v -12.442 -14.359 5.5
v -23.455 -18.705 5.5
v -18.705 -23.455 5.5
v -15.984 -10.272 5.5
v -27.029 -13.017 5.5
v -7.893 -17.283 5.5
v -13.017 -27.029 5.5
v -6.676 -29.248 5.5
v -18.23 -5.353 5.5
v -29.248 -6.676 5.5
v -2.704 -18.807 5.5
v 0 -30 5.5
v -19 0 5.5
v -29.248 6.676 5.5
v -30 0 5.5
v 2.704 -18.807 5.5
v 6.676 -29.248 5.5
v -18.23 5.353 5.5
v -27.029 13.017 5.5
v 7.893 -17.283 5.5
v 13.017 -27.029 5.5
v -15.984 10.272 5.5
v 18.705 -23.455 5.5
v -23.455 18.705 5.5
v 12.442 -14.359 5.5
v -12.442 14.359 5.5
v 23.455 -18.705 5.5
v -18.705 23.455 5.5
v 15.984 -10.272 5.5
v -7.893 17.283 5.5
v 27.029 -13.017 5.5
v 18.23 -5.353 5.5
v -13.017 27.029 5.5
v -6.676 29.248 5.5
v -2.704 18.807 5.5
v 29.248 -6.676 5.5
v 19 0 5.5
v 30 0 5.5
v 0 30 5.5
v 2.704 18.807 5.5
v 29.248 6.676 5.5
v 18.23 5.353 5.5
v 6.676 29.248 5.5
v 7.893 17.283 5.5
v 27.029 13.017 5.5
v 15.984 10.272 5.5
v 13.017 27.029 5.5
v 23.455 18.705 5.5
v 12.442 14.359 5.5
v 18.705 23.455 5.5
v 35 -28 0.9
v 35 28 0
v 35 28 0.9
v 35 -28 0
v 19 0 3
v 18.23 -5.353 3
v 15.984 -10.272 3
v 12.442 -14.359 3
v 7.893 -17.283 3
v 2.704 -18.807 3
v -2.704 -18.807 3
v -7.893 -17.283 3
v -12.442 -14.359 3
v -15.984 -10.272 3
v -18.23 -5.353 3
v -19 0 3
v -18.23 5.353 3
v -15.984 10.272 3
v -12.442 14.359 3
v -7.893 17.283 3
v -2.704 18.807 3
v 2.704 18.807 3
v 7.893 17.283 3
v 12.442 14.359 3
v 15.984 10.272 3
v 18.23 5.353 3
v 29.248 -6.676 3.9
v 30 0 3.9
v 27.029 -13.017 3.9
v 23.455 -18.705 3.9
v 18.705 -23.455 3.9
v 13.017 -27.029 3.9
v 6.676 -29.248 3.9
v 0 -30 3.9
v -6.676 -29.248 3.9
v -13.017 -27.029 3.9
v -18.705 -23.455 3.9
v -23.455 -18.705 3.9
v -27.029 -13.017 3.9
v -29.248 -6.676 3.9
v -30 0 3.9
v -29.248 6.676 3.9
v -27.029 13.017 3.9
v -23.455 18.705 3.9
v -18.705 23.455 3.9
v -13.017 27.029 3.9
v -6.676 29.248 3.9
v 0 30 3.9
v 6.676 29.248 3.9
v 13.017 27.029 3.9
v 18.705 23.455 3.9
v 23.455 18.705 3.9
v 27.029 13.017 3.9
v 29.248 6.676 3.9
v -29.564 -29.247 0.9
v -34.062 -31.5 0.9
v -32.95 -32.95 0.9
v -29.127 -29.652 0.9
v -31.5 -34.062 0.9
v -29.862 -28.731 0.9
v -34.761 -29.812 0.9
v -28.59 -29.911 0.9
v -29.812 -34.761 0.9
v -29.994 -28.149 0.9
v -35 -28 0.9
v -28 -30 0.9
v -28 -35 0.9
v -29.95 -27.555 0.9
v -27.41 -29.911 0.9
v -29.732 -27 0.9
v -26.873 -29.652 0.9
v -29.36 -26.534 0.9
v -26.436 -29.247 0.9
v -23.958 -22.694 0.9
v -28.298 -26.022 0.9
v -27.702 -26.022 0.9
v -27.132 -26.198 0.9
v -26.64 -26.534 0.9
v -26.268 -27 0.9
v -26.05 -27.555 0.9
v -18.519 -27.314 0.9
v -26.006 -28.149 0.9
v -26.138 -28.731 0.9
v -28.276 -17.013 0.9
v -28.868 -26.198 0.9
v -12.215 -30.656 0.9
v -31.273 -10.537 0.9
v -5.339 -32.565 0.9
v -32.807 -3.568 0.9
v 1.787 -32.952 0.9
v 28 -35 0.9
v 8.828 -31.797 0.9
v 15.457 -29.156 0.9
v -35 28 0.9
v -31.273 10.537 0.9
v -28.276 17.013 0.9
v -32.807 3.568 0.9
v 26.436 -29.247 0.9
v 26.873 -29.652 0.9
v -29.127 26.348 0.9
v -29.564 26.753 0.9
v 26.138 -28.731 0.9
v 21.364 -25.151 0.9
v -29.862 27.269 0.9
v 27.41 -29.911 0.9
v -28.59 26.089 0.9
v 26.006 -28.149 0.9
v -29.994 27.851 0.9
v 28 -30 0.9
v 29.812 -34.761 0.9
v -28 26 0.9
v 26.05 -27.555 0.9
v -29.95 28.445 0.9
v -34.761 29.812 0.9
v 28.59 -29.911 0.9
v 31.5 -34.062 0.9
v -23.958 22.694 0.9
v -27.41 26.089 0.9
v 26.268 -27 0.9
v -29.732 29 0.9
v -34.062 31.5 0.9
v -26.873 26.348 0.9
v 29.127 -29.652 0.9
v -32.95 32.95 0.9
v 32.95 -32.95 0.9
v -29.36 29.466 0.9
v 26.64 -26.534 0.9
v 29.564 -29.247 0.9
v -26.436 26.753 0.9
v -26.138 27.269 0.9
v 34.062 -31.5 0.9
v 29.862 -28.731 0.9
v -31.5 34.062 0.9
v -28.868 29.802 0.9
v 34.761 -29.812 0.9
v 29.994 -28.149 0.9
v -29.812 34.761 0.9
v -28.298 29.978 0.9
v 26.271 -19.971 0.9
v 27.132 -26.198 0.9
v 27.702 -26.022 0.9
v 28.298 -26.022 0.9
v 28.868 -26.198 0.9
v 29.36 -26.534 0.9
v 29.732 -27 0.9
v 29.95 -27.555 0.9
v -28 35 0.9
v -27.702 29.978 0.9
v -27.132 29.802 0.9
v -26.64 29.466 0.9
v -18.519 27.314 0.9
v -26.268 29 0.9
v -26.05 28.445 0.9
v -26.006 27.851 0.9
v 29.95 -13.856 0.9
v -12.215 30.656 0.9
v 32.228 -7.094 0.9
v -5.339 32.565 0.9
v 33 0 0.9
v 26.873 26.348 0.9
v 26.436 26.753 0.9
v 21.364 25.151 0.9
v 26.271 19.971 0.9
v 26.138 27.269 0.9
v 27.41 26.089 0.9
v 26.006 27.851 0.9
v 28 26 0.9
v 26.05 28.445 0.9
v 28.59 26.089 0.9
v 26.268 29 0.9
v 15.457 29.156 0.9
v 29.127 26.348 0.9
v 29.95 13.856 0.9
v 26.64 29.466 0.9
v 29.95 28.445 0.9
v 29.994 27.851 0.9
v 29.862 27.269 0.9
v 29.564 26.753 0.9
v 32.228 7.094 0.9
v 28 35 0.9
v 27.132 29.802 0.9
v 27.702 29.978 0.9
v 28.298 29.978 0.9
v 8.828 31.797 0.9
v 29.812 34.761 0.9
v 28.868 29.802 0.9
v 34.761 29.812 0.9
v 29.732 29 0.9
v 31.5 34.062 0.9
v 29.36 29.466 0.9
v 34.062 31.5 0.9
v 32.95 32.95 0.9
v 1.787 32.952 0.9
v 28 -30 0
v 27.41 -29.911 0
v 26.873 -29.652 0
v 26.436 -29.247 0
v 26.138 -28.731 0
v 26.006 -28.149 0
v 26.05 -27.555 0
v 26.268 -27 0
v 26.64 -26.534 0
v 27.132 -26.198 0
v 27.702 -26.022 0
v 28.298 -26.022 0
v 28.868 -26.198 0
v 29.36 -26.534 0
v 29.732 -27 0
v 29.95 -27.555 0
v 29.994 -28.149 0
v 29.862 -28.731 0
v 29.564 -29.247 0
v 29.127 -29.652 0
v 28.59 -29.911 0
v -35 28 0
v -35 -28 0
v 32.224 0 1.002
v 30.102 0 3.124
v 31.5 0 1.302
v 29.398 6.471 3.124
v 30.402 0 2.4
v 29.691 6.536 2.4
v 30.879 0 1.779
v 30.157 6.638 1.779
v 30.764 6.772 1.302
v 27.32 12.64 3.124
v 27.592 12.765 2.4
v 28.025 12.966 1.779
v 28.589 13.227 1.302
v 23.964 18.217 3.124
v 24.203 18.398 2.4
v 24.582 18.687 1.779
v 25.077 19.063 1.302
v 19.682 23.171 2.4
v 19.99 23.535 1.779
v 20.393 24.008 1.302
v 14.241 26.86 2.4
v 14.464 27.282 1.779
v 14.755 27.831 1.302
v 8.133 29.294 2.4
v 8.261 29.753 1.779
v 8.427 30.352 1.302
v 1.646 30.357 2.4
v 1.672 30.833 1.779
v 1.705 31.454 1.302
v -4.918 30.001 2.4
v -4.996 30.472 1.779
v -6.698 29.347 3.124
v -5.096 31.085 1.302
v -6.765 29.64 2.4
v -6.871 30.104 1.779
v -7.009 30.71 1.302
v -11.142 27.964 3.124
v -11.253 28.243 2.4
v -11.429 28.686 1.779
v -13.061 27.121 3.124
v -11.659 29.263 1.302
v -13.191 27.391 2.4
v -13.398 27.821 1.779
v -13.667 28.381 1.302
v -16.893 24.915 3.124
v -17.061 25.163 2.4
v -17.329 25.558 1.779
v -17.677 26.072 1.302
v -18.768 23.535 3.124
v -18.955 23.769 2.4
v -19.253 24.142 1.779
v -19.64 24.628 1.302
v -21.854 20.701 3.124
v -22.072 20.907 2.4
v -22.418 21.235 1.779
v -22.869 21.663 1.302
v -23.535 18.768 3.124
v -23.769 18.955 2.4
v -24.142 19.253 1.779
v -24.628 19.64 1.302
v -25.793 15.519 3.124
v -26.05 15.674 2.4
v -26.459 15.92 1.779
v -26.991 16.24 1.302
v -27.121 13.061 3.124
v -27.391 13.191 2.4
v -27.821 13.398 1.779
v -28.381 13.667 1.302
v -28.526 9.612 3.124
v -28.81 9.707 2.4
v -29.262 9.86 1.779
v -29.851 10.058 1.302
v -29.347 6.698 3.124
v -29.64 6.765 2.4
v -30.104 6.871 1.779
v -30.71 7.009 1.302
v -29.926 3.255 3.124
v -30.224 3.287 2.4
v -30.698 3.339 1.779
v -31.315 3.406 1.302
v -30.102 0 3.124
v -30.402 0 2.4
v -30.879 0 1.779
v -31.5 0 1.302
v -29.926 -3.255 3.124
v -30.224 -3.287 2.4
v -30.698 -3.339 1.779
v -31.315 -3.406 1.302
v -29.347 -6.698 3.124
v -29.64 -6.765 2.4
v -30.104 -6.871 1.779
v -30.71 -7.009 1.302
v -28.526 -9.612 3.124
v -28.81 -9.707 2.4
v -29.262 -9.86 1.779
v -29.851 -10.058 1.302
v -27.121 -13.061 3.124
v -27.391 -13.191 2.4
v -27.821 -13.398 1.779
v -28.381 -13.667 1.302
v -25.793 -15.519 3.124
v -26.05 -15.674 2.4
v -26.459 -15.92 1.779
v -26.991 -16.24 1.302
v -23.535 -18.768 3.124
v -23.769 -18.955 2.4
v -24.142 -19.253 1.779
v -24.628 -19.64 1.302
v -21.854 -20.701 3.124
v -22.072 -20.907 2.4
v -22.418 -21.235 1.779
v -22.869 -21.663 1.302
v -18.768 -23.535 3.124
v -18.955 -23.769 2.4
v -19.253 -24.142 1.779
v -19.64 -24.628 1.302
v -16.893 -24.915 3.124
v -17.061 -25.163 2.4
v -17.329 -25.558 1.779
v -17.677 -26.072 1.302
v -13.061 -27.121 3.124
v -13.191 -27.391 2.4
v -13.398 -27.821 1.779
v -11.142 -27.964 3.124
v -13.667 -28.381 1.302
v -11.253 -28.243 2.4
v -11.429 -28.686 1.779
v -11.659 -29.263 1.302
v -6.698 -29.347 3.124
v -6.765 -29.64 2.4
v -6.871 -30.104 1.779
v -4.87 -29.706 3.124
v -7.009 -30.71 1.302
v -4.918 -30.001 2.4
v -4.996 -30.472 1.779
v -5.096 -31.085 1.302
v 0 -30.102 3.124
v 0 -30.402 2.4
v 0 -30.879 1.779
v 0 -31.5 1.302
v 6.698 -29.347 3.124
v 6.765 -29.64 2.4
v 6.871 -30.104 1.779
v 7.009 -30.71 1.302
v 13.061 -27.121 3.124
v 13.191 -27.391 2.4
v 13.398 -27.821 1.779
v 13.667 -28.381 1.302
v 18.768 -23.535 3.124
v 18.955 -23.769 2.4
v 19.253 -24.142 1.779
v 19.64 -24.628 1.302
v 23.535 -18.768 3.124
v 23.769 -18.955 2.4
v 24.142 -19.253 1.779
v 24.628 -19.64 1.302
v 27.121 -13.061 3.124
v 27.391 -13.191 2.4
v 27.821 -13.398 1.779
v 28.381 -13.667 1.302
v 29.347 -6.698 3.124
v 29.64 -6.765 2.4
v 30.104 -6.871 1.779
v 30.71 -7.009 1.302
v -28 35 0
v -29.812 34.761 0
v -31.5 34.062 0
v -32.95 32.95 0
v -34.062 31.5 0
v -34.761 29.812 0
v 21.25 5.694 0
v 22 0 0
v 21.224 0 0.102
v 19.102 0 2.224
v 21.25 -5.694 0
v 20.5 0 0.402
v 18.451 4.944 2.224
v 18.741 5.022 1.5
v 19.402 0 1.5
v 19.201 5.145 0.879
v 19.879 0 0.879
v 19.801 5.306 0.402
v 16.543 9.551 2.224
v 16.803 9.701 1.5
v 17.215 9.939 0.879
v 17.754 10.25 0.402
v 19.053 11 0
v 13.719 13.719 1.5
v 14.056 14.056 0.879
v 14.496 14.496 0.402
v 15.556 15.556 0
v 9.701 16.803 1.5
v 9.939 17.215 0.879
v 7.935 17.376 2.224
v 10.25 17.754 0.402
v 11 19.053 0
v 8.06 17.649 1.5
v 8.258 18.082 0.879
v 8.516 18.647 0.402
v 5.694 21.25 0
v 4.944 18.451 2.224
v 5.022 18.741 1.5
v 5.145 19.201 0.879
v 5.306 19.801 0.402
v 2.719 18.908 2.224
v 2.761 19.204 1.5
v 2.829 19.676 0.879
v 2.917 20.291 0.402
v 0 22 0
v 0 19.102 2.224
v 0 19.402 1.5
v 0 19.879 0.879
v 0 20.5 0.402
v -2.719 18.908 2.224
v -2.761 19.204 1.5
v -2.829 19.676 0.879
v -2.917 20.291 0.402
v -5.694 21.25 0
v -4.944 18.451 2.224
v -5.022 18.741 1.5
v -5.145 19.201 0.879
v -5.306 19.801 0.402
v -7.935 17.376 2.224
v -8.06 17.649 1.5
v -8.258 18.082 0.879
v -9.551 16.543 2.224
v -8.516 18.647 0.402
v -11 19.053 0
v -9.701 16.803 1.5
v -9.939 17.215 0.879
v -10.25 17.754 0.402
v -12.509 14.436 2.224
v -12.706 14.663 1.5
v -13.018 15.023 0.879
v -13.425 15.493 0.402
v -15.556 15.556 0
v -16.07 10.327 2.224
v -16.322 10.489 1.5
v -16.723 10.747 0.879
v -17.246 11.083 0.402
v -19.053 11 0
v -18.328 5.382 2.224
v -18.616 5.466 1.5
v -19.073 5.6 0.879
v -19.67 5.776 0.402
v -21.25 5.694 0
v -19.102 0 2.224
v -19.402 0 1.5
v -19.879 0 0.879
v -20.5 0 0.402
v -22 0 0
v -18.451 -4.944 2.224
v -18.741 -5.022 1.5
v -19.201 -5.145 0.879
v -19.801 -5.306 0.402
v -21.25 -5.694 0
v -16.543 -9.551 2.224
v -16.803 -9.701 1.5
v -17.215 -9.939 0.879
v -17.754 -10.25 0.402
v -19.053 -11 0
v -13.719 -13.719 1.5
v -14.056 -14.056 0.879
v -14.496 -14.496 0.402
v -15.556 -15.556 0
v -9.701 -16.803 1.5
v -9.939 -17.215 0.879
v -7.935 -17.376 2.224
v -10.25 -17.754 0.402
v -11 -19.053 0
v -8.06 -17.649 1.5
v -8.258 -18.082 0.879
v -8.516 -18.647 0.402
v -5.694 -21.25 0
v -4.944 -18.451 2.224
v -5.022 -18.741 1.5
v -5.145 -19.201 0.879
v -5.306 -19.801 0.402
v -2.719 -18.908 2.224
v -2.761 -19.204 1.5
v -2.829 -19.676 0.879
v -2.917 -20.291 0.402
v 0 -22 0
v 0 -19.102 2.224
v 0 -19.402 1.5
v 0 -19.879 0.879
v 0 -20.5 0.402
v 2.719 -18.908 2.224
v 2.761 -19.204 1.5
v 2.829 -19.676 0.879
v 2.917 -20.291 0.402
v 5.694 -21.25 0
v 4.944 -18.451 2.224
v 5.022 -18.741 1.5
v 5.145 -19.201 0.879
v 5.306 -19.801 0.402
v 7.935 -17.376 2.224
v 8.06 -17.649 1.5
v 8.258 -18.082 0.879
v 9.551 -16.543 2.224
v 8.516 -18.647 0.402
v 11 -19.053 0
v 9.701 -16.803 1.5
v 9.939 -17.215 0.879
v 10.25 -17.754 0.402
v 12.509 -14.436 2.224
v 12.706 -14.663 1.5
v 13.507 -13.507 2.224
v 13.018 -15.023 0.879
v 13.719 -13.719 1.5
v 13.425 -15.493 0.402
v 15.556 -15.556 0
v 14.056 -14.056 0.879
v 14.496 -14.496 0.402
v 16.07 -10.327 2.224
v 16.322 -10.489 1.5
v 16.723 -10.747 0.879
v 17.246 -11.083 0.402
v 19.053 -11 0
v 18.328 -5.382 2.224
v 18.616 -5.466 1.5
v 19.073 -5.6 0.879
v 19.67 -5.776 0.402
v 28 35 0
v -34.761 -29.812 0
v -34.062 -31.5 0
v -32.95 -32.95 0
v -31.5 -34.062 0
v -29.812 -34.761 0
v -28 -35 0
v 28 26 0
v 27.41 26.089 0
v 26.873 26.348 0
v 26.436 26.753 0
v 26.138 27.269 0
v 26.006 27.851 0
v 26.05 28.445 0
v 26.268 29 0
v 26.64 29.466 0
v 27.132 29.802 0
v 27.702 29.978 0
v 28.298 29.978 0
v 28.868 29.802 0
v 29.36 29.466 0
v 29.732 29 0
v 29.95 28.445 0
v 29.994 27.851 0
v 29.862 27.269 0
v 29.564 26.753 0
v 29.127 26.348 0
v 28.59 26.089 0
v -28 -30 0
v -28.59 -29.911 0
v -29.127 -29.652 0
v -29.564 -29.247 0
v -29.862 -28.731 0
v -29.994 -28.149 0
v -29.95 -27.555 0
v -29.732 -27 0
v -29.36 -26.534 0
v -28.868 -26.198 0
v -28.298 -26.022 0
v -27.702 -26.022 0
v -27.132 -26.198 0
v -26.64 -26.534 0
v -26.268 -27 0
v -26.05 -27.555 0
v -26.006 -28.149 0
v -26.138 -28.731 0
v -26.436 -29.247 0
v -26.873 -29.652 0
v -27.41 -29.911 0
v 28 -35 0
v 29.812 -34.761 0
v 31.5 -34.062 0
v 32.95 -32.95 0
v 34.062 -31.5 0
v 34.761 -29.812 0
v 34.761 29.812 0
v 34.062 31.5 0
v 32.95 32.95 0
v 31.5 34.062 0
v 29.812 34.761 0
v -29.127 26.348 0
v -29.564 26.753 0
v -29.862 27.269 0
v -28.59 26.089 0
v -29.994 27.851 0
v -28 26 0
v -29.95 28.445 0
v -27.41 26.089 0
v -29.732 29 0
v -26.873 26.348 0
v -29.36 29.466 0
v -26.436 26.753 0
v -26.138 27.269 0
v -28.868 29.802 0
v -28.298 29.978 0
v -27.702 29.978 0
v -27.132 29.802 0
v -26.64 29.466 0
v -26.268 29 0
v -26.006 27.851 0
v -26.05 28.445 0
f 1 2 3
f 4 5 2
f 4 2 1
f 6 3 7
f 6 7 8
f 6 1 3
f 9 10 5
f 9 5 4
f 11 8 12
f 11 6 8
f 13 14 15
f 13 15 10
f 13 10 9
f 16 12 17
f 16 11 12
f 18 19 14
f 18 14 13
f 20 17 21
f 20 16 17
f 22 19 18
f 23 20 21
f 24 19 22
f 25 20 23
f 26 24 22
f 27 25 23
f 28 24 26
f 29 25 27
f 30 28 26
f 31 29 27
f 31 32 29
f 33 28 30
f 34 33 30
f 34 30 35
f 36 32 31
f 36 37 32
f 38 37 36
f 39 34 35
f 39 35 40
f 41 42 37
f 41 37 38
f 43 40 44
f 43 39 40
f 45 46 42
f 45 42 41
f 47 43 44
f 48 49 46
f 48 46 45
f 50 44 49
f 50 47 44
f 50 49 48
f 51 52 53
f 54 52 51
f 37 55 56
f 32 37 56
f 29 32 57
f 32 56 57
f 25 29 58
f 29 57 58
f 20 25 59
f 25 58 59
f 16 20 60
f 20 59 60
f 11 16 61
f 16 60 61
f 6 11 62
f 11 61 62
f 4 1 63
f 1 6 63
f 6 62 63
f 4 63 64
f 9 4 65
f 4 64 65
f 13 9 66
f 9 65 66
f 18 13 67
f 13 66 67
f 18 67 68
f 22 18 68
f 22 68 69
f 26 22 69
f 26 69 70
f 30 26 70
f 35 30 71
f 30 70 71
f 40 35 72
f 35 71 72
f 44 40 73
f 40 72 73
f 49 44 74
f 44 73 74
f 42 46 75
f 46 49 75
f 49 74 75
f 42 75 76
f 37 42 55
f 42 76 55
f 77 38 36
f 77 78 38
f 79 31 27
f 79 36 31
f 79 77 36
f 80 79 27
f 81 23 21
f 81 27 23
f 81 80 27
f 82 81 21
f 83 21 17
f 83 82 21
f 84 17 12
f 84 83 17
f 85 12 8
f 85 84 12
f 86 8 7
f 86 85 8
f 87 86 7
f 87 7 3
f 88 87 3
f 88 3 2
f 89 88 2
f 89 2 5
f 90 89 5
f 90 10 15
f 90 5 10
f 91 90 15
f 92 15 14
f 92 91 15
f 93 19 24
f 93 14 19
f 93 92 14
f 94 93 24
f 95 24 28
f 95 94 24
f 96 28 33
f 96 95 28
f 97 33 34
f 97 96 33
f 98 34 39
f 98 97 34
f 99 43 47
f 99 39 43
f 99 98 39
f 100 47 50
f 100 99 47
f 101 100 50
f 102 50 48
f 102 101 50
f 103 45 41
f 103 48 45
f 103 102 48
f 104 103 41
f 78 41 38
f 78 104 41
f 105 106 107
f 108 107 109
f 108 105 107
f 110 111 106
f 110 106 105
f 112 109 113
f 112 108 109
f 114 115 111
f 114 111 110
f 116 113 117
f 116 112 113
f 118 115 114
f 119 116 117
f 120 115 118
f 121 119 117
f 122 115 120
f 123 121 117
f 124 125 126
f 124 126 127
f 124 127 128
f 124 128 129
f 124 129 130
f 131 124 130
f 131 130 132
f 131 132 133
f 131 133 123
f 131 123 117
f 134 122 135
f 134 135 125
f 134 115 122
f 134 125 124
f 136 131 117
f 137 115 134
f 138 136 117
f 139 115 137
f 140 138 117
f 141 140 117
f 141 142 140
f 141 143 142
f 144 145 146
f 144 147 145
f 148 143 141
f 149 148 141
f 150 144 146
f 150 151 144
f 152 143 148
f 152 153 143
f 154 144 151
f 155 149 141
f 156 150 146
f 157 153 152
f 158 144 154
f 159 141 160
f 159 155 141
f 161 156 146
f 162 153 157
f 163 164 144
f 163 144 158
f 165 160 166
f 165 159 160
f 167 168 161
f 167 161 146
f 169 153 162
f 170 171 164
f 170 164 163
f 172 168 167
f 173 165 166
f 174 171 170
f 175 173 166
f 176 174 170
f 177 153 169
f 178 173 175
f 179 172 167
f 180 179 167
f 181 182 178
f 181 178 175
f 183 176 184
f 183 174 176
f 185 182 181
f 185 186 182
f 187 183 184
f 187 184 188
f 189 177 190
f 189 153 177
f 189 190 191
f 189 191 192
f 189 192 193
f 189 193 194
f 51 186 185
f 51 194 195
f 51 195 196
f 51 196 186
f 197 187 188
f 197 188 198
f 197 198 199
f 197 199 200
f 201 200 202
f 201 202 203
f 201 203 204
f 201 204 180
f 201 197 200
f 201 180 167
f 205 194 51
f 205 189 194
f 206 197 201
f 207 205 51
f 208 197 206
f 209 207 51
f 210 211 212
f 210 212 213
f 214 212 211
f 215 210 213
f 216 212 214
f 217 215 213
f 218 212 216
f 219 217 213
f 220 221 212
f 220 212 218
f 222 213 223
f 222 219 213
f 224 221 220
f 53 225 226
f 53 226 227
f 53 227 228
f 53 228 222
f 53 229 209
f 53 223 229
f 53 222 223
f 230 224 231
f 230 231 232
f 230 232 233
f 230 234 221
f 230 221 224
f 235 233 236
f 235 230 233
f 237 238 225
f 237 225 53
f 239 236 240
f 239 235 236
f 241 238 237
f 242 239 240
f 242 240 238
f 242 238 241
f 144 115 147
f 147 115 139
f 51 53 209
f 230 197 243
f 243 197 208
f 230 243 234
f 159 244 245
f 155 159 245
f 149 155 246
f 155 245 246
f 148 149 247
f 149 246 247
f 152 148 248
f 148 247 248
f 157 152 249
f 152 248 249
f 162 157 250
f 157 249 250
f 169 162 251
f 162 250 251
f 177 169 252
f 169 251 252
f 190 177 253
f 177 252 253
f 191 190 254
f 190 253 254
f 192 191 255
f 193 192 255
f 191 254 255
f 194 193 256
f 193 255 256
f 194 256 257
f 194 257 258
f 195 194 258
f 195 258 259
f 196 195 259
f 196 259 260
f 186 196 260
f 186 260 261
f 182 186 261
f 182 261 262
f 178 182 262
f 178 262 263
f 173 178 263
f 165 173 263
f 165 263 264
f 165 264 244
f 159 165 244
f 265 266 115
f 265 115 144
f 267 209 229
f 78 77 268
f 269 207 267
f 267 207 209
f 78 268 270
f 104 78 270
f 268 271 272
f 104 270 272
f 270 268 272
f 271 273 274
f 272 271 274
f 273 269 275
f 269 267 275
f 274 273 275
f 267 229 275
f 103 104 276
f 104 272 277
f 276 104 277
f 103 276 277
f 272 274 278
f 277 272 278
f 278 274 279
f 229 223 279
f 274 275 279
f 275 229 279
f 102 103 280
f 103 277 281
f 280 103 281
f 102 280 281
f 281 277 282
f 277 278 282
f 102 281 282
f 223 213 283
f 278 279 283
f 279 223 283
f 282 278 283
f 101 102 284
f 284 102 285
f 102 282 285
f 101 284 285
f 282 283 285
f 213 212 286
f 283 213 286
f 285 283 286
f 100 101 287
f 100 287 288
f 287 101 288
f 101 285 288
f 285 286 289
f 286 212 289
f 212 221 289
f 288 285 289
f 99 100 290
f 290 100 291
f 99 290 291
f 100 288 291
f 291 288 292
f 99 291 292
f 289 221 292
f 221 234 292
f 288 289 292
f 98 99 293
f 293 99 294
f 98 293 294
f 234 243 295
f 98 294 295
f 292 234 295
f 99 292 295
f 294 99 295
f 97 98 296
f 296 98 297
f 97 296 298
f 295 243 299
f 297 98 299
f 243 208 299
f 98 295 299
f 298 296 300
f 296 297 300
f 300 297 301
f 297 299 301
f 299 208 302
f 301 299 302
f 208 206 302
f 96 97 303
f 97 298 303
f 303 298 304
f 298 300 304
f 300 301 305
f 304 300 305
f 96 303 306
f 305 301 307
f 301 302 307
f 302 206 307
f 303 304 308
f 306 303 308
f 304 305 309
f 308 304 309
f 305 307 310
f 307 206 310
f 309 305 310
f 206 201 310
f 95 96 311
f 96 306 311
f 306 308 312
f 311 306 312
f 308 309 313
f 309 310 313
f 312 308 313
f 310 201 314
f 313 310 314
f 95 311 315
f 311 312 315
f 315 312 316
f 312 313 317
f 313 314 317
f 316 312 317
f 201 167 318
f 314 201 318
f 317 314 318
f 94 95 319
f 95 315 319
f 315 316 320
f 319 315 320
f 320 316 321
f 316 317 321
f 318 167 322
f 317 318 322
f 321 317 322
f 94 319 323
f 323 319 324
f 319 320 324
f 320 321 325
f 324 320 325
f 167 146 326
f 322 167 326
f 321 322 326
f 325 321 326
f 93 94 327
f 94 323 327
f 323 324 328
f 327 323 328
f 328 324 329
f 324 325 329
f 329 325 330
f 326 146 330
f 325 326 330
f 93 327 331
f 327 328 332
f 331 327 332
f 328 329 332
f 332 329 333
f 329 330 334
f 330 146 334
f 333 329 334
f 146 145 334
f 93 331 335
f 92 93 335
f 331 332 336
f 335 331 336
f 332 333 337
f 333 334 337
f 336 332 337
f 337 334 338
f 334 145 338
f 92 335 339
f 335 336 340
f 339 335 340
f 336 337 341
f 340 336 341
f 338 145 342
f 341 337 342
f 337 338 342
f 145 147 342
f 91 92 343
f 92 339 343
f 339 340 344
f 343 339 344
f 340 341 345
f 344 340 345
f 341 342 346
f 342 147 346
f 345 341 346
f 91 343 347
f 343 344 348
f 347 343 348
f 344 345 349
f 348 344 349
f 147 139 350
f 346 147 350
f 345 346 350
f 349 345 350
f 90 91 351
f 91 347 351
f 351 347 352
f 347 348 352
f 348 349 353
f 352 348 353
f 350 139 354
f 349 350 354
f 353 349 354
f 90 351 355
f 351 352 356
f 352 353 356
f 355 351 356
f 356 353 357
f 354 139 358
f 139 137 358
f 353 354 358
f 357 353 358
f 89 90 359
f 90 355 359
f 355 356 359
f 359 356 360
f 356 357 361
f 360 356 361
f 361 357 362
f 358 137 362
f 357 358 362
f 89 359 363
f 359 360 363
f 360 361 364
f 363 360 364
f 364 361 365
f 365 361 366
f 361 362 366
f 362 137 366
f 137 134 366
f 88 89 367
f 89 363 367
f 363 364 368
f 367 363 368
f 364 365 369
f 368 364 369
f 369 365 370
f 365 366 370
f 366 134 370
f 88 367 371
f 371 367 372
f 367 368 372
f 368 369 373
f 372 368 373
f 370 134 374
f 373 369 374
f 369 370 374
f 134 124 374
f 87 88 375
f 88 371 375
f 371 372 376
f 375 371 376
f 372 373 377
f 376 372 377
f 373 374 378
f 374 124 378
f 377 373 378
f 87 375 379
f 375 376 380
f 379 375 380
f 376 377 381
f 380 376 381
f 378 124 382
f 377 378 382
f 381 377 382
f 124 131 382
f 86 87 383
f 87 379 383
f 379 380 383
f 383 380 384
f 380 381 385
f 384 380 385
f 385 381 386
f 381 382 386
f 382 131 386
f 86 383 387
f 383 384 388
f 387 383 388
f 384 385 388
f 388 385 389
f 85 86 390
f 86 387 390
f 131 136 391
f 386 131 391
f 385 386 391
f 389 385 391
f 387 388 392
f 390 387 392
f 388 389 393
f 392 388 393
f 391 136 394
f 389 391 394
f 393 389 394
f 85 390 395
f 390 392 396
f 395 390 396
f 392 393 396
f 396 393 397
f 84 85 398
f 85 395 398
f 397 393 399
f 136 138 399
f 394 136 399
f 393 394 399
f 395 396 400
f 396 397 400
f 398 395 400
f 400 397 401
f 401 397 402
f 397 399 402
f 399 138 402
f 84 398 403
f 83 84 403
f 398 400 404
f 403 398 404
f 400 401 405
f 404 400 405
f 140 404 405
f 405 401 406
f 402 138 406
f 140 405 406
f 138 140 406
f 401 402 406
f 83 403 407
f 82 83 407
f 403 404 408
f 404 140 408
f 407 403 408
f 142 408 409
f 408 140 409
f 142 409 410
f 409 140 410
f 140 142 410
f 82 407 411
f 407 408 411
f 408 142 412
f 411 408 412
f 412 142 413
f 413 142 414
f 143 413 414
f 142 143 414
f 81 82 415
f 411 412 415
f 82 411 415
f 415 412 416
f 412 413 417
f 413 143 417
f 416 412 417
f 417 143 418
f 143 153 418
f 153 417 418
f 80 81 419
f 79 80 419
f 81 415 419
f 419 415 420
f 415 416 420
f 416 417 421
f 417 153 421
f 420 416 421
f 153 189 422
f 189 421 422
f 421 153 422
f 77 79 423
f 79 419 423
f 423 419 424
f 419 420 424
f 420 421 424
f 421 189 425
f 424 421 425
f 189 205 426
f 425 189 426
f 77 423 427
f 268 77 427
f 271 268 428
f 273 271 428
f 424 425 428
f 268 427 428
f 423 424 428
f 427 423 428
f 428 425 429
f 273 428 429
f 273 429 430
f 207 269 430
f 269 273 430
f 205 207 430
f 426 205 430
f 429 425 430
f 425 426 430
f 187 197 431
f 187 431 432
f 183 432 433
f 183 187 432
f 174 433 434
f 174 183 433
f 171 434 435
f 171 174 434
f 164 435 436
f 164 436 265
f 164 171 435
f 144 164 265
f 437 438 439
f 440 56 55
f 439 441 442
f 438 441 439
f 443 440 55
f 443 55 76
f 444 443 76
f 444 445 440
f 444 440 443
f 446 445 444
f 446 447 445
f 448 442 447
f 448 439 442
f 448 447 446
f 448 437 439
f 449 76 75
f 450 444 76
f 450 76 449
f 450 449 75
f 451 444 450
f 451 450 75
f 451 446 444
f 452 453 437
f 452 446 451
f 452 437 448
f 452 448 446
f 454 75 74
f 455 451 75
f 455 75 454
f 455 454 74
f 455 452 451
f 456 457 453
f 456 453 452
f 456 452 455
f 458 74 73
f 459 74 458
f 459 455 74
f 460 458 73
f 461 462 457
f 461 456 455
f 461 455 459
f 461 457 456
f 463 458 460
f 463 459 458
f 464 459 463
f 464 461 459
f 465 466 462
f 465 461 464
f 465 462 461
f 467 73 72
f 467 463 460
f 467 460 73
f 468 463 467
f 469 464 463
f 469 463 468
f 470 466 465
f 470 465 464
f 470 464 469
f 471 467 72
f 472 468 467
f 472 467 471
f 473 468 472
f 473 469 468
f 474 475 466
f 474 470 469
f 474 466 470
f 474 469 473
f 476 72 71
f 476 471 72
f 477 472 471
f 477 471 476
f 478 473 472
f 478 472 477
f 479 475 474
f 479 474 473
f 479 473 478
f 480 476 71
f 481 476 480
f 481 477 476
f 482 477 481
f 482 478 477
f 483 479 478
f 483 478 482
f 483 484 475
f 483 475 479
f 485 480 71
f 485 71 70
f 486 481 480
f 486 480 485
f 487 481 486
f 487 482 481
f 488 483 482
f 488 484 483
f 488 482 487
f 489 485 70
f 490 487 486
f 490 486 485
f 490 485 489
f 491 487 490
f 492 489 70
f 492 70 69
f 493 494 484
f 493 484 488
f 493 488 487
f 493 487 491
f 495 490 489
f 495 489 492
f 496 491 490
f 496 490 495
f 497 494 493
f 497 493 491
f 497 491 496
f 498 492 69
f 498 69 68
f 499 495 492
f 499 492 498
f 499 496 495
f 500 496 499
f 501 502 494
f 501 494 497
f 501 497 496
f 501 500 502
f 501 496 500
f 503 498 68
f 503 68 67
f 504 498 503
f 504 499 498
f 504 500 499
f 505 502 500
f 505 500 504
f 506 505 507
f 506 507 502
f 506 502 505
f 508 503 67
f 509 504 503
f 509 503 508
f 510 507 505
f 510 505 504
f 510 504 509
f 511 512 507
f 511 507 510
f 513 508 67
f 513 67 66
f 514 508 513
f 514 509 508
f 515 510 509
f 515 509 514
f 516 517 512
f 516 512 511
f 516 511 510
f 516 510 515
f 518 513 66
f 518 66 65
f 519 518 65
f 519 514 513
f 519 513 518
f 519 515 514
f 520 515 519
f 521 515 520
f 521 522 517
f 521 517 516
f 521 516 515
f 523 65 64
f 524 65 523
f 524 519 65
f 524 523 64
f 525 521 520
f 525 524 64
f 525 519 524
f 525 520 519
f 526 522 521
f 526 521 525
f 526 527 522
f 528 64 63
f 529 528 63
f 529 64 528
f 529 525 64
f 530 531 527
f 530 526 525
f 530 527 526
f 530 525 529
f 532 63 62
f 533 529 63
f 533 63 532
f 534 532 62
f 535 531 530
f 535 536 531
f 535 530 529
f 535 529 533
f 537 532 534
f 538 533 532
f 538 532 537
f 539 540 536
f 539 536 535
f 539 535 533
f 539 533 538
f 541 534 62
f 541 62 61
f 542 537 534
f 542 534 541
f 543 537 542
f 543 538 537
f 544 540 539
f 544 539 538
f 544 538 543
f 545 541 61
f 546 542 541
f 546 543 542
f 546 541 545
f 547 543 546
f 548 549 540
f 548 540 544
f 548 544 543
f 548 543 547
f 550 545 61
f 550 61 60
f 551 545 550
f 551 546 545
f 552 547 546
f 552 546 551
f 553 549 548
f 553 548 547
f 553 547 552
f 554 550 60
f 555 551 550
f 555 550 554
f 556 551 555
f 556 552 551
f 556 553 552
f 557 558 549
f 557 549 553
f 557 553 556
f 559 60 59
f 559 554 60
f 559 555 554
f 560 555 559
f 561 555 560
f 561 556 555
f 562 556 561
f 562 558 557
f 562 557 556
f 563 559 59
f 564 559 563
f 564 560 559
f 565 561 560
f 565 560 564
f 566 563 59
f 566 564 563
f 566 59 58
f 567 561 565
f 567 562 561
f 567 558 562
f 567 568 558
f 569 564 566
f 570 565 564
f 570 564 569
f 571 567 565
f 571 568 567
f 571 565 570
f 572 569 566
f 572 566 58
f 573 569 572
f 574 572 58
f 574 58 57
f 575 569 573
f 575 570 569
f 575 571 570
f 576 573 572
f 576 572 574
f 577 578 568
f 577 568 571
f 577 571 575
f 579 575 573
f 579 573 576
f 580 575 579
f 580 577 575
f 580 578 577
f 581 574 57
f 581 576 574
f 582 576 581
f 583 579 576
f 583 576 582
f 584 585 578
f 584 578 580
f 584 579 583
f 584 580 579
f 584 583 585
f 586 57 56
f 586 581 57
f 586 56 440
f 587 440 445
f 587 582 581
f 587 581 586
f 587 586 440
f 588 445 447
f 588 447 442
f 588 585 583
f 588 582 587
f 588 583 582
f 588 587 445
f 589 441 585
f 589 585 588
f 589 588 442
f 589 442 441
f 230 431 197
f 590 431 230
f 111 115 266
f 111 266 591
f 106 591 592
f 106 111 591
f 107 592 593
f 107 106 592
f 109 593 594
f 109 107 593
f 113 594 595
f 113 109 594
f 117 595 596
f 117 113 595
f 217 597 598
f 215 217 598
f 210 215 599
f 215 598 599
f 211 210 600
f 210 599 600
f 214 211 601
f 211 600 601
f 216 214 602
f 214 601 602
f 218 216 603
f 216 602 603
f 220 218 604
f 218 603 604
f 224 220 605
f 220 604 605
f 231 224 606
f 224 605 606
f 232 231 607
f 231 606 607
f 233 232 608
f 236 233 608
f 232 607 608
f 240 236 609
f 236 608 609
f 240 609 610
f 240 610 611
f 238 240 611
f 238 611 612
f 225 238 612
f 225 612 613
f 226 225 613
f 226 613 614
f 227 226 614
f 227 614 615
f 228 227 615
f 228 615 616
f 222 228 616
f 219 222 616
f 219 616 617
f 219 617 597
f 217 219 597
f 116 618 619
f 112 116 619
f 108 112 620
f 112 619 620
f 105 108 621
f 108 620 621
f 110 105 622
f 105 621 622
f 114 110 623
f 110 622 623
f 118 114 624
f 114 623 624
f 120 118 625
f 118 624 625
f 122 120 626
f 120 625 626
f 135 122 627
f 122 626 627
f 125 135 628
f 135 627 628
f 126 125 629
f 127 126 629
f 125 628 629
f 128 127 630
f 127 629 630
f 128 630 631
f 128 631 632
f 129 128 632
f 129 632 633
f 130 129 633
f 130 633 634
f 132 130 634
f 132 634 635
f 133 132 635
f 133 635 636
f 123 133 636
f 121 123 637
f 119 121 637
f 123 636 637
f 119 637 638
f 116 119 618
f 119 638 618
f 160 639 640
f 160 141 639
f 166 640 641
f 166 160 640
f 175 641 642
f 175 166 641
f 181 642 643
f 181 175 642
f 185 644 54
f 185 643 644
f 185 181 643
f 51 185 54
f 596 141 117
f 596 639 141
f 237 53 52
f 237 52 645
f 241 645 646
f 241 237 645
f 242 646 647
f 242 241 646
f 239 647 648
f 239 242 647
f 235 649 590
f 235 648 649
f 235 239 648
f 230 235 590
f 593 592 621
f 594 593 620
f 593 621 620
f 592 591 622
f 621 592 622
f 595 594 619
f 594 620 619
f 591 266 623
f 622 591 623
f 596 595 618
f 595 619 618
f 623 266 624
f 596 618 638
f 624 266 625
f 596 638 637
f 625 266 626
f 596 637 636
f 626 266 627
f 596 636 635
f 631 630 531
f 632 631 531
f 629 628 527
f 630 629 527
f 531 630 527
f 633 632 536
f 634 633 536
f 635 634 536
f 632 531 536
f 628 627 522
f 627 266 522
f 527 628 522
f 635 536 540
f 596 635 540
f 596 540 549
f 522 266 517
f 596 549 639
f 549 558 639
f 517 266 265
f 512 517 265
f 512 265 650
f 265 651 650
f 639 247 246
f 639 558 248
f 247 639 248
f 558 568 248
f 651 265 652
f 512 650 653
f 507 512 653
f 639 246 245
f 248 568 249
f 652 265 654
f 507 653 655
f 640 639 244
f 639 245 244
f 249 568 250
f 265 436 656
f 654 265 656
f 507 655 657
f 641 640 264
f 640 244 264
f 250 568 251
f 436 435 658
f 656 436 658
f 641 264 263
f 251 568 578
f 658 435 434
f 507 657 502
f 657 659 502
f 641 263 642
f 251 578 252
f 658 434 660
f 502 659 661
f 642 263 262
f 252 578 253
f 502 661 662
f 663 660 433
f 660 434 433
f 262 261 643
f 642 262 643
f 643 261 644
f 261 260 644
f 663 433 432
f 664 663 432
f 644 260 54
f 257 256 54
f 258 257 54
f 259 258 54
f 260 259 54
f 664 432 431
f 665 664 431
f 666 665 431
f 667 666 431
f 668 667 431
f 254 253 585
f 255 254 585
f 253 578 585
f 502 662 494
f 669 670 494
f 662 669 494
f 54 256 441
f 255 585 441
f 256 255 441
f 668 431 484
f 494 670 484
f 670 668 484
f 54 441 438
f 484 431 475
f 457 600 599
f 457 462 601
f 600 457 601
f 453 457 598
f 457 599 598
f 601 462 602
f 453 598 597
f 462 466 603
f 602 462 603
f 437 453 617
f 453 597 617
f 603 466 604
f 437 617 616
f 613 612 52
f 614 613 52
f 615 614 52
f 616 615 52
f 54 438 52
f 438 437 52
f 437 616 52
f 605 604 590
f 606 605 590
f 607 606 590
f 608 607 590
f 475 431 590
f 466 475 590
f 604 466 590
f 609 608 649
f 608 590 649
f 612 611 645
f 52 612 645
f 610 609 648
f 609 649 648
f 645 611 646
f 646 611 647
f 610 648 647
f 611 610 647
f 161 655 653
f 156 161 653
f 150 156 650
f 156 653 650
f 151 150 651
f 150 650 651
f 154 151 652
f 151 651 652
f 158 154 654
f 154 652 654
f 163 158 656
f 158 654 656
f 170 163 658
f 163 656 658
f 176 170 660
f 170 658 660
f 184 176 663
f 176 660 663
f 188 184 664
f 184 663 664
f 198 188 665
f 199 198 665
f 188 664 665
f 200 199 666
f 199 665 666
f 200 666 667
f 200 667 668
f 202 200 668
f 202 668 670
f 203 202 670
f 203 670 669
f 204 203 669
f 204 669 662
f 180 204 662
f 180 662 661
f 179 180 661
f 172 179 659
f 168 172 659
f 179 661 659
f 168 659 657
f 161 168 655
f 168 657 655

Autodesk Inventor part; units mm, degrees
ref_plane "YZ Plane" through (0, 0, 0) normal (1, 0, 0) x (0, 1, 0)
ref_plane "XZ Plane" through (0, 0, 0) normal (0, 1, 0) x (-1, 0, 0)
ref_plane "XY Plane" through (0, 0, 0) normal (0, 0, 1) x (1, 0, 0)
sketch "Skizze1" plane through (0, 0, 0) normal (0, 0, 1) x (1, 0, 0)
  line L0 (-35, 35) -> (35, 35)
  line L1 (35, 35) -> (35, -35)
  line L2 (35, -35) -> (-35, -35)
  line L3 (-35, -35) -> (-35, 35)
  circle A0 centre (0, 0) radius 35
  circle A1 centre (0, 0) radius 19
  dimension "d0" = 70
  dimension "d1" = 38
extrude "Extrusion1" add sketch "Skizze1" along normal blind 0.9
fillet "Rundung1" radius 7 4 edges at (-35, -35, 0.45) (35, -35, 0.45) (-35, 35, 0.45) (35, 35, 0.45)
sketch "Skizze2" plane through (0, 0, 0.9) normal (0, 0, 1) x (1, 0, 0)
  arc A0 (35, 28) -> (28, 35) centre (28, 28) ccw projected
  arc A1 (-28, 35) -> (-35, 28) centre (-28, 28) ccw projected
  arc A2 (-35, -28) -> (-28, -35) centre (-28, -28) ccw projected
  arc A3 (28, -35) -> (35, -28) centre (28, -28) ccw projected
  dimension "d16" = 56
hole "Bohrung1" at (-28, -28, 0.9) at (28, -28, 0.9) at (28, 28, 0.9) at (-28, 28, 0.9) direction (0, 0, -1) diameter 4 depth 8 tip angle 118
sketch "Skizze3" plane through (0, 0, 0.9) normal (0, 0, 1) x (1, 0, 0)
  circle A0 centre (0, 0) radius 19 projected
  circle A1 centre (0, 0) radius 30
  dimension "d12" = 60
extrude "Extrusion2" add sketch "Skizze3" along normal blind 4.6
fillet "Rundung2" radius 3 2 edges at (-19, 0, 0) (-30, 0, 0.9)
properties part number "70mmkugellager" material "Stahl, galvanisiert"
